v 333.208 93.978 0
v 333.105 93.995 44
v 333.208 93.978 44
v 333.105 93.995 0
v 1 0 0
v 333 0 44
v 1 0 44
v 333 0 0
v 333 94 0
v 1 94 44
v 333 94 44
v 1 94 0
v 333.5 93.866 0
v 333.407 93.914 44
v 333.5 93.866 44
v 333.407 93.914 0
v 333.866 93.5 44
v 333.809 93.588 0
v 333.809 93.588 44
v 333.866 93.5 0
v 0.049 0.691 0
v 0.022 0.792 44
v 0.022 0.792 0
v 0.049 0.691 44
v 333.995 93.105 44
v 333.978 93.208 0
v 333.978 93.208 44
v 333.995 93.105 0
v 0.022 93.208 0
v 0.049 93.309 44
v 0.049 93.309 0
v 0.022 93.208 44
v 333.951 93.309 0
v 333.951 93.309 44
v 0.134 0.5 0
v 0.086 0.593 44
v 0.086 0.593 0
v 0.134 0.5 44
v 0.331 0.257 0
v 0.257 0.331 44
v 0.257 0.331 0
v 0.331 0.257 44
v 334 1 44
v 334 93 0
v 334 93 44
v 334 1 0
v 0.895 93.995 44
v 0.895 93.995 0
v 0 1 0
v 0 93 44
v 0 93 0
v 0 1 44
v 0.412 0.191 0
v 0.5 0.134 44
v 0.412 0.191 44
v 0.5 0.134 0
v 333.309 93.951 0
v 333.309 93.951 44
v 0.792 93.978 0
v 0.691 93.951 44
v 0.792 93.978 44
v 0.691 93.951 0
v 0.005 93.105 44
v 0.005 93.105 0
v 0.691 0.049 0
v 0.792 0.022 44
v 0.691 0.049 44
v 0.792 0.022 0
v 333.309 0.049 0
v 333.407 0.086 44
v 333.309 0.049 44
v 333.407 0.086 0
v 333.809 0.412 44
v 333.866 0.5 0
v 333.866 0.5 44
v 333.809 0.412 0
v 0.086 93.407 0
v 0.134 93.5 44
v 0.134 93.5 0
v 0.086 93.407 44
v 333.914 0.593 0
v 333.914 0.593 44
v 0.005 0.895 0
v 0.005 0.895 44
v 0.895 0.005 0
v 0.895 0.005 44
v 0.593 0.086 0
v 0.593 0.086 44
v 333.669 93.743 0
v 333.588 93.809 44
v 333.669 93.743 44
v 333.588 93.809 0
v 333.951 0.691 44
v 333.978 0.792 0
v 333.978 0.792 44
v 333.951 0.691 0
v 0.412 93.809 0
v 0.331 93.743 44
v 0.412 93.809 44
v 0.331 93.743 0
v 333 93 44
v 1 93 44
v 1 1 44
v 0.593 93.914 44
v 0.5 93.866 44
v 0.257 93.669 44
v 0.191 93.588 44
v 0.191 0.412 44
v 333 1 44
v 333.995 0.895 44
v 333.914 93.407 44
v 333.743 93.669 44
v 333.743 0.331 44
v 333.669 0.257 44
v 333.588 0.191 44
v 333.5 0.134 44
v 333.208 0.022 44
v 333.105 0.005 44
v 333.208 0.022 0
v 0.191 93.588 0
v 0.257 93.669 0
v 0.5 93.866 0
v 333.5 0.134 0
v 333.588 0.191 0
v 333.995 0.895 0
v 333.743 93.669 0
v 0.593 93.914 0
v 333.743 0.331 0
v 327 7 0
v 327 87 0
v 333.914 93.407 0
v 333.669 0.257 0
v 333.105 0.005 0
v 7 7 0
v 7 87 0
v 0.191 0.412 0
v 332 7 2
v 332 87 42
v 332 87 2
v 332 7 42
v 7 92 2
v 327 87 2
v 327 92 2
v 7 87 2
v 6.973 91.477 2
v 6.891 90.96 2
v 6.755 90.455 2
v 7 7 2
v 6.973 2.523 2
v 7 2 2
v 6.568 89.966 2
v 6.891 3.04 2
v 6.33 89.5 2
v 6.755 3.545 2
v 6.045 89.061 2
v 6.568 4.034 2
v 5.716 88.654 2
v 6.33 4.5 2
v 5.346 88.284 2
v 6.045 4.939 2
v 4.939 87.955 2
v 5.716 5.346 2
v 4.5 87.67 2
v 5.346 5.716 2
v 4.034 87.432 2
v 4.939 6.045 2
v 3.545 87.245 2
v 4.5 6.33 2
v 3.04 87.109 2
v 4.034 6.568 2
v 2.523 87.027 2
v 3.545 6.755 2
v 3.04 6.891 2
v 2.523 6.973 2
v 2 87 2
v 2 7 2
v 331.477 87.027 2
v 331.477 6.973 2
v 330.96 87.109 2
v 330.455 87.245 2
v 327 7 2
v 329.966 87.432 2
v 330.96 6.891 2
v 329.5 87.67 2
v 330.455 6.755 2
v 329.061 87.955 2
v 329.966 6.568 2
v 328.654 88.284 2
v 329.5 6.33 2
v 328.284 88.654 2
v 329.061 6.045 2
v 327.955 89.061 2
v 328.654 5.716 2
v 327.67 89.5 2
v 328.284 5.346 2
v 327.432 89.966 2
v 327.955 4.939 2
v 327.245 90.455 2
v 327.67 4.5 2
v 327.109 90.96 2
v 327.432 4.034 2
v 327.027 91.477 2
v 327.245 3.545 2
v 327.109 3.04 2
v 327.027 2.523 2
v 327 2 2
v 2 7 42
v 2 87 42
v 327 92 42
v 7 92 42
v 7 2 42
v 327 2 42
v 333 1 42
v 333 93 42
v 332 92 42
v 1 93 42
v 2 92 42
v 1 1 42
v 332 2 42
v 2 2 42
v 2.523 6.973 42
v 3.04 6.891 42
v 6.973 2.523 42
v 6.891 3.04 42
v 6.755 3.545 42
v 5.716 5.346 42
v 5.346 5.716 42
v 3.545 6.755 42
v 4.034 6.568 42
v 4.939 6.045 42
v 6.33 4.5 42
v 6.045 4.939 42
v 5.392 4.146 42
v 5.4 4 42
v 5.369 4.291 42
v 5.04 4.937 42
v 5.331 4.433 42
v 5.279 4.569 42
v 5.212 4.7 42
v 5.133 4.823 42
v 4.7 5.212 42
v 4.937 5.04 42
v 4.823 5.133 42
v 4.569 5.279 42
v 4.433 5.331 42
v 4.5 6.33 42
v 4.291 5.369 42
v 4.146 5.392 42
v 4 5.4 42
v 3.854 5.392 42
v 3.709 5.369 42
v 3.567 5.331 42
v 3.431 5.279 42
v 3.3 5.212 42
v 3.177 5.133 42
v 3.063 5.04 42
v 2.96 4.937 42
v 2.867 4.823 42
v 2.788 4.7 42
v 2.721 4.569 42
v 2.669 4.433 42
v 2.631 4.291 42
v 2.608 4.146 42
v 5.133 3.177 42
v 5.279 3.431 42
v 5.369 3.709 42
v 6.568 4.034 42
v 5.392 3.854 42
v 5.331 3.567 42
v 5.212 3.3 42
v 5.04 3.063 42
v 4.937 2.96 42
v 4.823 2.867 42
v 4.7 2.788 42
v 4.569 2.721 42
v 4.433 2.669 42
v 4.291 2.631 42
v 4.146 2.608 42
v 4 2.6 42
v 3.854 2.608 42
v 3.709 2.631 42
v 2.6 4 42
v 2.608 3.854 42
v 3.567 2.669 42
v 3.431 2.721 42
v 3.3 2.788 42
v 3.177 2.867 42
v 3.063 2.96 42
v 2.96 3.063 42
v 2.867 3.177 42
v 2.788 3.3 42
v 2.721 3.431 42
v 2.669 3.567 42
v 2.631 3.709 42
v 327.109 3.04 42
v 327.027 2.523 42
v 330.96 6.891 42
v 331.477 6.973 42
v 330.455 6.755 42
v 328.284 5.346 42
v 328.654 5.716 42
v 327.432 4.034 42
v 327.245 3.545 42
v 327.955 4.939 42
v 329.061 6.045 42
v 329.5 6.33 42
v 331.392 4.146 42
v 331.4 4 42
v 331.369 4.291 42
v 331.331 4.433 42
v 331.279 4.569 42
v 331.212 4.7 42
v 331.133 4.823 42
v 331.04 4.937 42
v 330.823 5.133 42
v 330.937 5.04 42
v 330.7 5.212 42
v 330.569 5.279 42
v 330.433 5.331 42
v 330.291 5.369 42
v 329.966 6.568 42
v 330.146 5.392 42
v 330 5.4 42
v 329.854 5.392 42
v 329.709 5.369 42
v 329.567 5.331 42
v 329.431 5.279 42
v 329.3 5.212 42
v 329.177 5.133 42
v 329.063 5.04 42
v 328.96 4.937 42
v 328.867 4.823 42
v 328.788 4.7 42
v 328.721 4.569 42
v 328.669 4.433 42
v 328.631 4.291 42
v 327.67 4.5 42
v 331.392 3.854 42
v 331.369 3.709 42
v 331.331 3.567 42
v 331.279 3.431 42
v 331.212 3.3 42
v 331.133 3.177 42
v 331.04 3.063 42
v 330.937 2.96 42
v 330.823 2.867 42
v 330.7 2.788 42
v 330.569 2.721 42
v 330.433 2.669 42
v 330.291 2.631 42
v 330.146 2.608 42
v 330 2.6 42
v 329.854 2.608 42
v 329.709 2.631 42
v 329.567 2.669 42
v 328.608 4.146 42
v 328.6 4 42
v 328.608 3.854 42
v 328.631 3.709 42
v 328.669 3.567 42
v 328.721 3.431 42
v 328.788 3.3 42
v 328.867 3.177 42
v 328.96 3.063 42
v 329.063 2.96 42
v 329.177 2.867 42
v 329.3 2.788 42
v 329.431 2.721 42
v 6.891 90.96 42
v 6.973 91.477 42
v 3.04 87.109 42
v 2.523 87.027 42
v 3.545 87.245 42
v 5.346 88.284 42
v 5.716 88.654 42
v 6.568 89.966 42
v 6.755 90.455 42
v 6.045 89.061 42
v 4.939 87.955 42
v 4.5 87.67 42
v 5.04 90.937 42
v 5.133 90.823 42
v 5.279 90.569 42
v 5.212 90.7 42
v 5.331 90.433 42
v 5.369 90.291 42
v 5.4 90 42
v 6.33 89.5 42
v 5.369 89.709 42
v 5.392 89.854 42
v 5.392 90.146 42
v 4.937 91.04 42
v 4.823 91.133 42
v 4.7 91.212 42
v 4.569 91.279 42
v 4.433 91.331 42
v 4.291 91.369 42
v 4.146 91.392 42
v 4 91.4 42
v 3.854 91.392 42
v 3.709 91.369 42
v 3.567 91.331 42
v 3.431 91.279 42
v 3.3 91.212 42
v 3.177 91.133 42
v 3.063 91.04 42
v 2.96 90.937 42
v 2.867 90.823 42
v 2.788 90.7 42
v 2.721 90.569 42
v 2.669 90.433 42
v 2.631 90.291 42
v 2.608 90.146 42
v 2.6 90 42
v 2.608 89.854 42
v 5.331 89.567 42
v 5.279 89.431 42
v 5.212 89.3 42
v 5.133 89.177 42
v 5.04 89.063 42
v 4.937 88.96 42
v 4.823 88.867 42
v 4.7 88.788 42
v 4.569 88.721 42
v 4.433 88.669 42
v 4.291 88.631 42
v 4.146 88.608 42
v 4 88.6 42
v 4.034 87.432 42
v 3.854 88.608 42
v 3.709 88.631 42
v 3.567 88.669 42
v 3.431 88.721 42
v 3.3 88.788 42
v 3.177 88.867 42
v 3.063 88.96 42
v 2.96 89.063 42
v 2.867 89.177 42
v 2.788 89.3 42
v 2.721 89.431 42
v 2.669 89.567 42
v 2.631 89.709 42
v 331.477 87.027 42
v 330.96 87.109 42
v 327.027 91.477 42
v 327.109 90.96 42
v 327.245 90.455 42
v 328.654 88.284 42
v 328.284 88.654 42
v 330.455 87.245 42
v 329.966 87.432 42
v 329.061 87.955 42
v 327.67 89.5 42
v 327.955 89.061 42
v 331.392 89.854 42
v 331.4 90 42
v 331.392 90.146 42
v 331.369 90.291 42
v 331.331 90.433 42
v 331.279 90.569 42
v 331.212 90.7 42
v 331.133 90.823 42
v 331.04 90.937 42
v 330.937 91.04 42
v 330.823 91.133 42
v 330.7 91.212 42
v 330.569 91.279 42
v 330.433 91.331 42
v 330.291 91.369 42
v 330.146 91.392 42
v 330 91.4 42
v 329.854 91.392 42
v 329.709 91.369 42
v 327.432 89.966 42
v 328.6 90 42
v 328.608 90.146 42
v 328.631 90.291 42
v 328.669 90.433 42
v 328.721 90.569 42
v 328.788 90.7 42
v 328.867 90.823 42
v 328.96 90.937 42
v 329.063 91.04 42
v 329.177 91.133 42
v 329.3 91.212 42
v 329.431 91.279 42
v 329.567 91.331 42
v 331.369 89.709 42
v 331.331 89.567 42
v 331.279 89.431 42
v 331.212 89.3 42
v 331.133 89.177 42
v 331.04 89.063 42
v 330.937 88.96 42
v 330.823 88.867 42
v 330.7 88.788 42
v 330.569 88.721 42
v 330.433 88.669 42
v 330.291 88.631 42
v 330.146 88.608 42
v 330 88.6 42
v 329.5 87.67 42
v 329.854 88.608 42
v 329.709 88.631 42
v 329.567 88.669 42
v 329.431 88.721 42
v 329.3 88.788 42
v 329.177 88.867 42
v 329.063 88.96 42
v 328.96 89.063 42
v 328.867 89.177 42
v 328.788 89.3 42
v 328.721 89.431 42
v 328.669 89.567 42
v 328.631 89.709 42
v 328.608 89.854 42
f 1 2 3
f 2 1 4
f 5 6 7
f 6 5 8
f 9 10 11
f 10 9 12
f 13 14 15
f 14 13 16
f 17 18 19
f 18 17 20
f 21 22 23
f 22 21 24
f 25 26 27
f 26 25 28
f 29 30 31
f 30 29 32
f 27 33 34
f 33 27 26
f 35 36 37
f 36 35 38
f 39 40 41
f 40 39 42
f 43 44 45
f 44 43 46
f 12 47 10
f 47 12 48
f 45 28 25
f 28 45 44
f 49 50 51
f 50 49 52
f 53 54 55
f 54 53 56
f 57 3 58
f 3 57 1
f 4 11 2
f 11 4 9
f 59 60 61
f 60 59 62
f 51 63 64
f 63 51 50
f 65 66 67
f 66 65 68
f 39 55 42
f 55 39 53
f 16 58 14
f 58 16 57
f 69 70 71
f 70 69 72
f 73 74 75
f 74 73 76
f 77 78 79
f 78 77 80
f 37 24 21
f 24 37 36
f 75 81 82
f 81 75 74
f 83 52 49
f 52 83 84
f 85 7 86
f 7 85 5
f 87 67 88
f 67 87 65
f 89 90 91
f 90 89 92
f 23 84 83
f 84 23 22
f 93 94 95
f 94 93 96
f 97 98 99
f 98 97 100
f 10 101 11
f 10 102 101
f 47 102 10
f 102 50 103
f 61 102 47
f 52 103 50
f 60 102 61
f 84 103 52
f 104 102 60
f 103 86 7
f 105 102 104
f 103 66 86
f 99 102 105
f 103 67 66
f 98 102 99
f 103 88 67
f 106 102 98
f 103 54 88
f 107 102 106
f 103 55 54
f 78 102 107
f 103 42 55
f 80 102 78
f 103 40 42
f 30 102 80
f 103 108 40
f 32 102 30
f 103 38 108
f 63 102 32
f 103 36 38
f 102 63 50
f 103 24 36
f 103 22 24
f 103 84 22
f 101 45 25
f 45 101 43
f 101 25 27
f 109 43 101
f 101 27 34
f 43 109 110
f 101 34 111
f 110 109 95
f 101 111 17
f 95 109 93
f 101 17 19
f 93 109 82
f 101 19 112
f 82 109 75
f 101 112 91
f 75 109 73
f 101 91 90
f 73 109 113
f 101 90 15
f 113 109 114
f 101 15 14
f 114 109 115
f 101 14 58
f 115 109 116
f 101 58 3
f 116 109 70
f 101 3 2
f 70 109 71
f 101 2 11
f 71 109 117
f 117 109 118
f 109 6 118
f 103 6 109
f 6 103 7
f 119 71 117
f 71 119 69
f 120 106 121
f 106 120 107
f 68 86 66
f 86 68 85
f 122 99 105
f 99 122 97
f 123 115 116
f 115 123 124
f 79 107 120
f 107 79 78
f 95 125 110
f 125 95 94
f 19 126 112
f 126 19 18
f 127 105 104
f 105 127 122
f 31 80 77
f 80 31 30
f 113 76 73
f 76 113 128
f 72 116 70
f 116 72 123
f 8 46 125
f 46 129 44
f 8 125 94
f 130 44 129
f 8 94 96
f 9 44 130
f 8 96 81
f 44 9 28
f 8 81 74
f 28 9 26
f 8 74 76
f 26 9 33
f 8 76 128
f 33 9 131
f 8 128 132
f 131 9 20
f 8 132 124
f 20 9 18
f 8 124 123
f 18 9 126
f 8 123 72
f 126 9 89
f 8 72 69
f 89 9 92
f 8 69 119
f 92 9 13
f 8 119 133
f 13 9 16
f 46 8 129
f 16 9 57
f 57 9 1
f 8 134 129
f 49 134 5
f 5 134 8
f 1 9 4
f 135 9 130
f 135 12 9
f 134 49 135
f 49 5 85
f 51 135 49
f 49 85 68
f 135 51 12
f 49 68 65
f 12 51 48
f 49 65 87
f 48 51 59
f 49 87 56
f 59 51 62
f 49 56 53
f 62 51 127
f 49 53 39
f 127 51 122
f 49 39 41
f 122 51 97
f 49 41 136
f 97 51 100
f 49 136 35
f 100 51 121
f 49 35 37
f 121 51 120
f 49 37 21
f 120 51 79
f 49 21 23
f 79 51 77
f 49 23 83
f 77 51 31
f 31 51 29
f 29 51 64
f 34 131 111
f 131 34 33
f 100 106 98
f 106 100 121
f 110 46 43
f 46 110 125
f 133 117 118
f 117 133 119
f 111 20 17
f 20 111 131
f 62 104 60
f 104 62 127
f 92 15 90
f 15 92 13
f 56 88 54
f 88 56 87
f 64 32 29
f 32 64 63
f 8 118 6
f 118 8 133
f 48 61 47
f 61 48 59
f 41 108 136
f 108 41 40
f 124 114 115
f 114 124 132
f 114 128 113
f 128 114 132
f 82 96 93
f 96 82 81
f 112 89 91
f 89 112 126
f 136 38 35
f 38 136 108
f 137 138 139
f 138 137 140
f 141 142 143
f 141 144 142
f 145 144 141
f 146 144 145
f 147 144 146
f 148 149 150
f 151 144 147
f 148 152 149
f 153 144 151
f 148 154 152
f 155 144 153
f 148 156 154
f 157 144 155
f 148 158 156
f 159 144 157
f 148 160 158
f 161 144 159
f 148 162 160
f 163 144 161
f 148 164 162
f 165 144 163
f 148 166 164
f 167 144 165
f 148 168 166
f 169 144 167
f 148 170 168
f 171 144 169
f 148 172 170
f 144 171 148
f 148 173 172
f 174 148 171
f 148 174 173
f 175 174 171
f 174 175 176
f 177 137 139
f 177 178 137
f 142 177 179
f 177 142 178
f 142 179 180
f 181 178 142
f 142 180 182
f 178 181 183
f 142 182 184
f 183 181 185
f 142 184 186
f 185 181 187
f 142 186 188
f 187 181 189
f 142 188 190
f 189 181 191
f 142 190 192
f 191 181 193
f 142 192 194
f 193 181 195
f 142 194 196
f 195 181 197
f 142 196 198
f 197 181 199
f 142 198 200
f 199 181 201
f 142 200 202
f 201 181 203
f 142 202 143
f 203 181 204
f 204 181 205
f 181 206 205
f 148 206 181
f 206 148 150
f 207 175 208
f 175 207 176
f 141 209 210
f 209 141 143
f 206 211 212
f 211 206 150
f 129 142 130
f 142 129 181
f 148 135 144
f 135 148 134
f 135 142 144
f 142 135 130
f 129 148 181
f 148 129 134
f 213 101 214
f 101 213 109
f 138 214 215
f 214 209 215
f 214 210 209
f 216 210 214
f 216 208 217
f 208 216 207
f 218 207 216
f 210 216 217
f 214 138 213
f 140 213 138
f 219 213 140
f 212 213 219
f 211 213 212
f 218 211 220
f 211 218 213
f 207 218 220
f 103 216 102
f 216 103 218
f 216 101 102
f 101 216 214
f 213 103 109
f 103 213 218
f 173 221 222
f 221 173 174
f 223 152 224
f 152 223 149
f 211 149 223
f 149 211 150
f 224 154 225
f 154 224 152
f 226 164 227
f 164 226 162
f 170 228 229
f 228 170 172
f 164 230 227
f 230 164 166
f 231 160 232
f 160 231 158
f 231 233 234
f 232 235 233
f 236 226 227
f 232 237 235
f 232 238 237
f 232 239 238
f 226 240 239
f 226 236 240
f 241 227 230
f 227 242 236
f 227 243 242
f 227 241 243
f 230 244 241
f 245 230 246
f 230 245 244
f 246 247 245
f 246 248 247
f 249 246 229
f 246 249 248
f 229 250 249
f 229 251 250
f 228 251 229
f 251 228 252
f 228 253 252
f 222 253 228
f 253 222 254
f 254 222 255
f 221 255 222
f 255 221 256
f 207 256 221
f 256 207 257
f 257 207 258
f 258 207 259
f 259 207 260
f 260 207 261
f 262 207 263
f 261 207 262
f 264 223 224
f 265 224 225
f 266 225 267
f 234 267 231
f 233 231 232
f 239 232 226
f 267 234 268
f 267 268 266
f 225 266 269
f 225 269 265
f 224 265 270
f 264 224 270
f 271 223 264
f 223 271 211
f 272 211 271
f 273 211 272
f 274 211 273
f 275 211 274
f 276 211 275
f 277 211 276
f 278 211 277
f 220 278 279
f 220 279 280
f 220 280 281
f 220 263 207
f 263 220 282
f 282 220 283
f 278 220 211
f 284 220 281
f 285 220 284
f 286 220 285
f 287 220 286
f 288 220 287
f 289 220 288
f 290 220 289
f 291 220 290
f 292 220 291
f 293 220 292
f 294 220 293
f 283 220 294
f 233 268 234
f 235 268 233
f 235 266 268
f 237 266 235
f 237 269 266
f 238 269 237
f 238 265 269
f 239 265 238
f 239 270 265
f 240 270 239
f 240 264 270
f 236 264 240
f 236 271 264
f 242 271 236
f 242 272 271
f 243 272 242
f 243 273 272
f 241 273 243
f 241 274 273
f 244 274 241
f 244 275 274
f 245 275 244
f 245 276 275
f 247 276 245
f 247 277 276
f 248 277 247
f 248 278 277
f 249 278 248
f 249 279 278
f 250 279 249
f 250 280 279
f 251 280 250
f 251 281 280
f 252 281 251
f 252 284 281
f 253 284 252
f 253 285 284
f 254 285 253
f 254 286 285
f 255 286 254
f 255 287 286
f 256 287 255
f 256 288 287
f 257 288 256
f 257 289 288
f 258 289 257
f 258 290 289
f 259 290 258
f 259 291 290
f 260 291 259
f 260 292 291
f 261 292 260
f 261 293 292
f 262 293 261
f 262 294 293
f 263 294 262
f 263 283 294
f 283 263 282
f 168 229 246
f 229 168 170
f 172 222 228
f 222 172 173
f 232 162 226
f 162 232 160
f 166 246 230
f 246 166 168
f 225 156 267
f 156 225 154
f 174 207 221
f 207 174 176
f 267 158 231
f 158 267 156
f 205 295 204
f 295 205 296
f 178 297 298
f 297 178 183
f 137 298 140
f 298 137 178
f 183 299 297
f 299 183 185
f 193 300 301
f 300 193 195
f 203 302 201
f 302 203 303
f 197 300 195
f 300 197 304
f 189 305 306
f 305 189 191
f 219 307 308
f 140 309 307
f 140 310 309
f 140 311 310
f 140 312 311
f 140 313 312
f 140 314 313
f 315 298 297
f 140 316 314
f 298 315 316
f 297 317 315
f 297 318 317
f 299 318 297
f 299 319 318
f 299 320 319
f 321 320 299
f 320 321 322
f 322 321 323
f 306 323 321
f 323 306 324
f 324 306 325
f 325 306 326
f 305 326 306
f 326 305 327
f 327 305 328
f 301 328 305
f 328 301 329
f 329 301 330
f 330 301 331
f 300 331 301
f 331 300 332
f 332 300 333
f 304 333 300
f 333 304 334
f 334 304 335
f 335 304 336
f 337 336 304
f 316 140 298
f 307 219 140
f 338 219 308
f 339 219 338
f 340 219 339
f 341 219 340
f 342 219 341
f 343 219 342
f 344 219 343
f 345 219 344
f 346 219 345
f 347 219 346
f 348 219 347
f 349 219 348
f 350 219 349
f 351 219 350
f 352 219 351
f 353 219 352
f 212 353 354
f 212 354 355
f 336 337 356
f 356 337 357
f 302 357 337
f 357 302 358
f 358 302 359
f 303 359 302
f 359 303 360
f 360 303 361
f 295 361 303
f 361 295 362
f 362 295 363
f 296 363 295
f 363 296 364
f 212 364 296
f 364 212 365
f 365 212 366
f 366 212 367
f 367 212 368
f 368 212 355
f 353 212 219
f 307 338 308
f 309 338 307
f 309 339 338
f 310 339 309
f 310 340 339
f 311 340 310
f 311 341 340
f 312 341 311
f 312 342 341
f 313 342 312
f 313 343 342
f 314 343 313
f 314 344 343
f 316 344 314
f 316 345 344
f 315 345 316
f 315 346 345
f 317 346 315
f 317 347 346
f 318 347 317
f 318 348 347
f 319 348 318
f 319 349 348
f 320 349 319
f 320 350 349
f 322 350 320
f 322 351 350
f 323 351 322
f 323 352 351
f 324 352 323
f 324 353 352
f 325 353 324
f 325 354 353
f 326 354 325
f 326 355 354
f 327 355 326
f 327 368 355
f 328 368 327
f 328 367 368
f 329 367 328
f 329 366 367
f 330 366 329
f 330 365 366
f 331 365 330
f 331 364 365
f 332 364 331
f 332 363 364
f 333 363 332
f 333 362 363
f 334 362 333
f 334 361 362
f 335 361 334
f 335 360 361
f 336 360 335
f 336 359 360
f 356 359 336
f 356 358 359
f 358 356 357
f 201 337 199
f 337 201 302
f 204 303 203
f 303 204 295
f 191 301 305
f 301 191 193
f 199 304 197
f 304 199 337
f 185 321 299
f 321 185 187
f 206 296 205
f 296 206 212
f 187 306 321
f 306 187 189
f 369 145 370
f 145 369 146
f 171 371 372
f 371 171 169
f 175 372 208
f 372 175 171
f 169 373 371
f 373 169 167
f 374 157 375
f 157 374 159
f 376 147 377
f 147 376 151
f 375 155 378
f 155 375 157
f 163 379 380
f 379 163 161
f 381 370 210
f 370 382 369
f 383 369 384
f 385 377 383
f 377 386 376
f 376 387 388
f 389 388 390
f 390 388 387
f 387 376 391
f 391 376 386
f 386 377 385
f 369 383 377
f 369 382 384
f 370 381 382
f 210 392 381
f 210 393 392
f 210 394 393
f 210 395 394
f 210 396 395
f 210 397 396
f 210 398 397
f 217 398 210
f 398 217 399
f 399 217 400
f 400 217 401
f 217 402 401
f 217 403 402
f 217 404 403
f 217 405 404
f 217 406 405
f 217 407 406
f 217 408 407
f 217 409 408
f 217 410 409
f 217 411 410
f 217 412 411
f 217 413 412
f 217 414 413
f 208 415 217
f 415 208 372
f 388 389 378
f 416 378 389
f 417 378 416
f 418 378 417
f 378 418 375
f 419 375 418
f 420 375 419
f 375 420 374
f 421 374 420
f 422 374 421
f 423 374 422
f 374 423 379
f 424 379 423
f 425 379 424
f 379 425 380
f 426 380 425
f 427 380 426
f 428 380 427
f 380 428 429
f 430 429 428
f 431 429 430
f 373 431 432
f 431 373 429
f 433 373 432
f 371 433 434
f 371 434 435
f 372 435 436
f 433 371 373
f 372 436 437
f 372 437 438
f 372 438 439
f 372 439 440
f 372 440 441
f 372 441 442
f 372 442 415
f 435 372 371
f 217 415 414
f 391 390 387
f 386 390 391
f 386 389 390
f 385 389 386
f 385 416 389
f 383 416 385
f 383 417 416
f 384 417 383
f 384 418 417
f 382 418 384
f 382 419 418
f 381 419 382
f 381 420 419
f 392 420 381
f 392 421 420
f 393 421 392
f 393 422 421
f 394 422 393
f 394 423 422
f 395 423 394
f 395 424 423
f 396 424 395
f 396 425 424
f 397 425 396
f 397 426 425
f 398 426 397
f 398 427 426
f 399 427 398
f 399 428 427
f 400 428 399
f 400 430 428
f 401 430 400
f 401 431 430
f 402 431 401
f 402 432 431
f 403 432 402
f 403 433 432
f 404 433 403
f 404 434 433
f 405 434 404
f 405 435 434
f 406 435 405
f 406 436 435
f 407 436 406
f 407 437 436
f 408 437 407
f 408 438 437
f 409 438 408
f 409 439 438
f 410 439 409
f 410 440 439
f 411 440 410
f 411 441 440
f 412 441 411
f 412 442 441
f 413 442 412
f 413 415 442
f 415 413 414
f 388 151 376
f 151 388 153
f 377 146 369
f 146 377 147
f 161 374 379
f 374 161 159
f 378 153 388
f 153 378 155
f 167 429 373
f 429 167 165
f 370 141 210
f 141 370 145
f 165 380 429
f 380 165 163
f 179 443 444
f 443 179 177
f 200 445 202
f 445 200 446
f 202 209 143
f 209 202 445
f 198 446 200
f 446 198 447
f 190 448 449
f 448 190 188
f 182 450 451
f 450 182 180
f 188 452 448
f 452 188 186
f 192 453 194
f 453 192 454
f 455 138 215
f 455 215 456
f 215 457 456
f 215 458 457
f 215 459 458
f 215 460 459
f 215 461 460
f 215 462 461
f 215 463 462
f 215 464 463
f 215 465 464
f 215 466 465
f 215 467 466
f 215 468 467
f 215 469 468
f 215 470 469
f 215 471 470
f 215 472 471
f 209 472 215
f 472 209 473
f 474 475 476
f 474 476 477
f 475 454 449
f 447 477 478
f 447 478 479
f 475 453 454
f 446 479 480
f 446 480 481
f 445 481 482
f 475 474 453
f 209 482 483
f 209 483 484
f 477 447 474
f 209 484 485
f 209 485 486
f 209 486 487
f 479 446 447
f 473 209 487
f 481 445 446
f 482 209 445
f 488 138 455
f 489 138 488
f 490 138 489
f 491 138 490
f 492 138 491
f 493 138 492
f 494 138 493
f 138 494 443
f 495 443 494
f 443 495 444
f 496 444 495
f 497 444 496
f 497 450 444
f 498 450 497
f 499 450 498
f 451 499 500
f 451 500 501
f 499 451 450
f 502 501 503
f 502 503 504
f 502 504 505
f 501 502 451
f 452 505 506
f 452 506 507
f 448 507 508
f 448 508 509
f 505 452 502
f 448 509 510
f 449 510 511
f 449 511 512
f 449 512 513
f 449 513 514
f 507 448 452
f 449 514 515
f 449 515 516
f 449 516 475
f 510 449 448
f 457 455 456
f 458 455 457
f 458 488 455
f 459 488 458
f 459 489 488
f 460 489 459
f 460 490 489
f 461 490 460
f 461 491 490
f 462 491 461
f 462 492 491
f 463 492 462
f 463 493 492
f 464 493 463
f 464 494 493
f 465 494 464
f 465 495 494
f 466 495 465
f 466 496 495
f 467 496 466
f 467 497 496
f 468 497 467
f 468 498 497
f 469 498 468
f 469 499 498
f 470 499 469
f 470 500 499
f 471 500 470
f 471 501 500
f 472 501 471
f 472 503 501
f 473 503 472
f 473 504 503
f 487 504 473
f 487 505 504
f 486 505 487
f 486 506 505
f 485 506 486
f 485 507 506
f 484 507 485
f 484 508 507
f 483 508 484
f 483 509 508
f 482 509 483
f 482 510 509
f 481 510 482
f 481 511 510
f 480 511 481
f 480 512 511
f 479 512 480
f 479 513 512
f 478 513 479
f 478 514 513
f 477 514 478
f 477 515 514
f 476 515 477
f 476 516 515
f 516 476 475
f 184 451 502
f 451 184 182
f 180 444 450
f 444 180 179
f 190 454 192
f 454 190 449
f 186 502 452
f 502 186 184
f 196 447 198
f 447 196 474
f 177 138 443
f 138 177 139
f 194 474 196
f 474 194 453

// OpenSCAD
// file: constant.scad
$fn = 60;

screw_depth = 20;
screw_diameter = 2.8;

border = 2;
border_radius = 1;
matrice_border = 5;

width = 330;
height = 90;
depth = 40;

diffuser_depth = 10;
diffuser_border = 1;
// main file
include <constant.scad>;

module box(){ 
    difference() {
        // box with round corner
        hull(){
            translate([border_radius, border_radius, 0])
                cylinder(h=depth + border * 2, r=border_radius);
            translate([width + border + border_radius, border_radius, 0])
                cylinder(h=depth + border * 2, r=border_radius);
            translate([border_radius, height + border + border_radius, 0])
                cylinder(h=depth + border * 2, r=border_radius);
            translate([width + border + border_radius, height + border + border_radius, 0])
                cylinder(h=depth + border * 2, r=border_radius);
        }
        // empty cube inside
        translate([border, border, border])
            cube([width, height, depth + border]);
        // border for the matrice
        translate([matrice_border + border, matrice_border + border, 0])
            cube([width - matrice_border * 2, height - matrice_border * 2, border]);
        // gap at the back plate
        translate([border / 2, border / 2, depth + border])
            cube([width + border, height + border, border]);
    }

    module supportAndScrewHole(){ 
        difference() {
            // suport for screw hole
            intersection() {
                cylinder(d=10, h=depth);
                cube([5, 5, depth]);
            }
            // screw hole
            translate([2, 2, depth])
                cylinder(d=screw_diameter, h=screw_depth);
        }
    }

    // add support and screw hole in each angle 
    translate([border, border, border]) 
        supportAndScrewHole();
    translate([width + border, border, border]) 
        rotate([0, 0, 90])
            supportAndScrewHole();
    translate([border, height + border, border]) 
        rotate([0, 0, -90])
            supportAndScrewHole();
    translate([width + border, height + border, border])
        rotate([0, 0, 180])
            supportAndScrewHole();
}

box();
